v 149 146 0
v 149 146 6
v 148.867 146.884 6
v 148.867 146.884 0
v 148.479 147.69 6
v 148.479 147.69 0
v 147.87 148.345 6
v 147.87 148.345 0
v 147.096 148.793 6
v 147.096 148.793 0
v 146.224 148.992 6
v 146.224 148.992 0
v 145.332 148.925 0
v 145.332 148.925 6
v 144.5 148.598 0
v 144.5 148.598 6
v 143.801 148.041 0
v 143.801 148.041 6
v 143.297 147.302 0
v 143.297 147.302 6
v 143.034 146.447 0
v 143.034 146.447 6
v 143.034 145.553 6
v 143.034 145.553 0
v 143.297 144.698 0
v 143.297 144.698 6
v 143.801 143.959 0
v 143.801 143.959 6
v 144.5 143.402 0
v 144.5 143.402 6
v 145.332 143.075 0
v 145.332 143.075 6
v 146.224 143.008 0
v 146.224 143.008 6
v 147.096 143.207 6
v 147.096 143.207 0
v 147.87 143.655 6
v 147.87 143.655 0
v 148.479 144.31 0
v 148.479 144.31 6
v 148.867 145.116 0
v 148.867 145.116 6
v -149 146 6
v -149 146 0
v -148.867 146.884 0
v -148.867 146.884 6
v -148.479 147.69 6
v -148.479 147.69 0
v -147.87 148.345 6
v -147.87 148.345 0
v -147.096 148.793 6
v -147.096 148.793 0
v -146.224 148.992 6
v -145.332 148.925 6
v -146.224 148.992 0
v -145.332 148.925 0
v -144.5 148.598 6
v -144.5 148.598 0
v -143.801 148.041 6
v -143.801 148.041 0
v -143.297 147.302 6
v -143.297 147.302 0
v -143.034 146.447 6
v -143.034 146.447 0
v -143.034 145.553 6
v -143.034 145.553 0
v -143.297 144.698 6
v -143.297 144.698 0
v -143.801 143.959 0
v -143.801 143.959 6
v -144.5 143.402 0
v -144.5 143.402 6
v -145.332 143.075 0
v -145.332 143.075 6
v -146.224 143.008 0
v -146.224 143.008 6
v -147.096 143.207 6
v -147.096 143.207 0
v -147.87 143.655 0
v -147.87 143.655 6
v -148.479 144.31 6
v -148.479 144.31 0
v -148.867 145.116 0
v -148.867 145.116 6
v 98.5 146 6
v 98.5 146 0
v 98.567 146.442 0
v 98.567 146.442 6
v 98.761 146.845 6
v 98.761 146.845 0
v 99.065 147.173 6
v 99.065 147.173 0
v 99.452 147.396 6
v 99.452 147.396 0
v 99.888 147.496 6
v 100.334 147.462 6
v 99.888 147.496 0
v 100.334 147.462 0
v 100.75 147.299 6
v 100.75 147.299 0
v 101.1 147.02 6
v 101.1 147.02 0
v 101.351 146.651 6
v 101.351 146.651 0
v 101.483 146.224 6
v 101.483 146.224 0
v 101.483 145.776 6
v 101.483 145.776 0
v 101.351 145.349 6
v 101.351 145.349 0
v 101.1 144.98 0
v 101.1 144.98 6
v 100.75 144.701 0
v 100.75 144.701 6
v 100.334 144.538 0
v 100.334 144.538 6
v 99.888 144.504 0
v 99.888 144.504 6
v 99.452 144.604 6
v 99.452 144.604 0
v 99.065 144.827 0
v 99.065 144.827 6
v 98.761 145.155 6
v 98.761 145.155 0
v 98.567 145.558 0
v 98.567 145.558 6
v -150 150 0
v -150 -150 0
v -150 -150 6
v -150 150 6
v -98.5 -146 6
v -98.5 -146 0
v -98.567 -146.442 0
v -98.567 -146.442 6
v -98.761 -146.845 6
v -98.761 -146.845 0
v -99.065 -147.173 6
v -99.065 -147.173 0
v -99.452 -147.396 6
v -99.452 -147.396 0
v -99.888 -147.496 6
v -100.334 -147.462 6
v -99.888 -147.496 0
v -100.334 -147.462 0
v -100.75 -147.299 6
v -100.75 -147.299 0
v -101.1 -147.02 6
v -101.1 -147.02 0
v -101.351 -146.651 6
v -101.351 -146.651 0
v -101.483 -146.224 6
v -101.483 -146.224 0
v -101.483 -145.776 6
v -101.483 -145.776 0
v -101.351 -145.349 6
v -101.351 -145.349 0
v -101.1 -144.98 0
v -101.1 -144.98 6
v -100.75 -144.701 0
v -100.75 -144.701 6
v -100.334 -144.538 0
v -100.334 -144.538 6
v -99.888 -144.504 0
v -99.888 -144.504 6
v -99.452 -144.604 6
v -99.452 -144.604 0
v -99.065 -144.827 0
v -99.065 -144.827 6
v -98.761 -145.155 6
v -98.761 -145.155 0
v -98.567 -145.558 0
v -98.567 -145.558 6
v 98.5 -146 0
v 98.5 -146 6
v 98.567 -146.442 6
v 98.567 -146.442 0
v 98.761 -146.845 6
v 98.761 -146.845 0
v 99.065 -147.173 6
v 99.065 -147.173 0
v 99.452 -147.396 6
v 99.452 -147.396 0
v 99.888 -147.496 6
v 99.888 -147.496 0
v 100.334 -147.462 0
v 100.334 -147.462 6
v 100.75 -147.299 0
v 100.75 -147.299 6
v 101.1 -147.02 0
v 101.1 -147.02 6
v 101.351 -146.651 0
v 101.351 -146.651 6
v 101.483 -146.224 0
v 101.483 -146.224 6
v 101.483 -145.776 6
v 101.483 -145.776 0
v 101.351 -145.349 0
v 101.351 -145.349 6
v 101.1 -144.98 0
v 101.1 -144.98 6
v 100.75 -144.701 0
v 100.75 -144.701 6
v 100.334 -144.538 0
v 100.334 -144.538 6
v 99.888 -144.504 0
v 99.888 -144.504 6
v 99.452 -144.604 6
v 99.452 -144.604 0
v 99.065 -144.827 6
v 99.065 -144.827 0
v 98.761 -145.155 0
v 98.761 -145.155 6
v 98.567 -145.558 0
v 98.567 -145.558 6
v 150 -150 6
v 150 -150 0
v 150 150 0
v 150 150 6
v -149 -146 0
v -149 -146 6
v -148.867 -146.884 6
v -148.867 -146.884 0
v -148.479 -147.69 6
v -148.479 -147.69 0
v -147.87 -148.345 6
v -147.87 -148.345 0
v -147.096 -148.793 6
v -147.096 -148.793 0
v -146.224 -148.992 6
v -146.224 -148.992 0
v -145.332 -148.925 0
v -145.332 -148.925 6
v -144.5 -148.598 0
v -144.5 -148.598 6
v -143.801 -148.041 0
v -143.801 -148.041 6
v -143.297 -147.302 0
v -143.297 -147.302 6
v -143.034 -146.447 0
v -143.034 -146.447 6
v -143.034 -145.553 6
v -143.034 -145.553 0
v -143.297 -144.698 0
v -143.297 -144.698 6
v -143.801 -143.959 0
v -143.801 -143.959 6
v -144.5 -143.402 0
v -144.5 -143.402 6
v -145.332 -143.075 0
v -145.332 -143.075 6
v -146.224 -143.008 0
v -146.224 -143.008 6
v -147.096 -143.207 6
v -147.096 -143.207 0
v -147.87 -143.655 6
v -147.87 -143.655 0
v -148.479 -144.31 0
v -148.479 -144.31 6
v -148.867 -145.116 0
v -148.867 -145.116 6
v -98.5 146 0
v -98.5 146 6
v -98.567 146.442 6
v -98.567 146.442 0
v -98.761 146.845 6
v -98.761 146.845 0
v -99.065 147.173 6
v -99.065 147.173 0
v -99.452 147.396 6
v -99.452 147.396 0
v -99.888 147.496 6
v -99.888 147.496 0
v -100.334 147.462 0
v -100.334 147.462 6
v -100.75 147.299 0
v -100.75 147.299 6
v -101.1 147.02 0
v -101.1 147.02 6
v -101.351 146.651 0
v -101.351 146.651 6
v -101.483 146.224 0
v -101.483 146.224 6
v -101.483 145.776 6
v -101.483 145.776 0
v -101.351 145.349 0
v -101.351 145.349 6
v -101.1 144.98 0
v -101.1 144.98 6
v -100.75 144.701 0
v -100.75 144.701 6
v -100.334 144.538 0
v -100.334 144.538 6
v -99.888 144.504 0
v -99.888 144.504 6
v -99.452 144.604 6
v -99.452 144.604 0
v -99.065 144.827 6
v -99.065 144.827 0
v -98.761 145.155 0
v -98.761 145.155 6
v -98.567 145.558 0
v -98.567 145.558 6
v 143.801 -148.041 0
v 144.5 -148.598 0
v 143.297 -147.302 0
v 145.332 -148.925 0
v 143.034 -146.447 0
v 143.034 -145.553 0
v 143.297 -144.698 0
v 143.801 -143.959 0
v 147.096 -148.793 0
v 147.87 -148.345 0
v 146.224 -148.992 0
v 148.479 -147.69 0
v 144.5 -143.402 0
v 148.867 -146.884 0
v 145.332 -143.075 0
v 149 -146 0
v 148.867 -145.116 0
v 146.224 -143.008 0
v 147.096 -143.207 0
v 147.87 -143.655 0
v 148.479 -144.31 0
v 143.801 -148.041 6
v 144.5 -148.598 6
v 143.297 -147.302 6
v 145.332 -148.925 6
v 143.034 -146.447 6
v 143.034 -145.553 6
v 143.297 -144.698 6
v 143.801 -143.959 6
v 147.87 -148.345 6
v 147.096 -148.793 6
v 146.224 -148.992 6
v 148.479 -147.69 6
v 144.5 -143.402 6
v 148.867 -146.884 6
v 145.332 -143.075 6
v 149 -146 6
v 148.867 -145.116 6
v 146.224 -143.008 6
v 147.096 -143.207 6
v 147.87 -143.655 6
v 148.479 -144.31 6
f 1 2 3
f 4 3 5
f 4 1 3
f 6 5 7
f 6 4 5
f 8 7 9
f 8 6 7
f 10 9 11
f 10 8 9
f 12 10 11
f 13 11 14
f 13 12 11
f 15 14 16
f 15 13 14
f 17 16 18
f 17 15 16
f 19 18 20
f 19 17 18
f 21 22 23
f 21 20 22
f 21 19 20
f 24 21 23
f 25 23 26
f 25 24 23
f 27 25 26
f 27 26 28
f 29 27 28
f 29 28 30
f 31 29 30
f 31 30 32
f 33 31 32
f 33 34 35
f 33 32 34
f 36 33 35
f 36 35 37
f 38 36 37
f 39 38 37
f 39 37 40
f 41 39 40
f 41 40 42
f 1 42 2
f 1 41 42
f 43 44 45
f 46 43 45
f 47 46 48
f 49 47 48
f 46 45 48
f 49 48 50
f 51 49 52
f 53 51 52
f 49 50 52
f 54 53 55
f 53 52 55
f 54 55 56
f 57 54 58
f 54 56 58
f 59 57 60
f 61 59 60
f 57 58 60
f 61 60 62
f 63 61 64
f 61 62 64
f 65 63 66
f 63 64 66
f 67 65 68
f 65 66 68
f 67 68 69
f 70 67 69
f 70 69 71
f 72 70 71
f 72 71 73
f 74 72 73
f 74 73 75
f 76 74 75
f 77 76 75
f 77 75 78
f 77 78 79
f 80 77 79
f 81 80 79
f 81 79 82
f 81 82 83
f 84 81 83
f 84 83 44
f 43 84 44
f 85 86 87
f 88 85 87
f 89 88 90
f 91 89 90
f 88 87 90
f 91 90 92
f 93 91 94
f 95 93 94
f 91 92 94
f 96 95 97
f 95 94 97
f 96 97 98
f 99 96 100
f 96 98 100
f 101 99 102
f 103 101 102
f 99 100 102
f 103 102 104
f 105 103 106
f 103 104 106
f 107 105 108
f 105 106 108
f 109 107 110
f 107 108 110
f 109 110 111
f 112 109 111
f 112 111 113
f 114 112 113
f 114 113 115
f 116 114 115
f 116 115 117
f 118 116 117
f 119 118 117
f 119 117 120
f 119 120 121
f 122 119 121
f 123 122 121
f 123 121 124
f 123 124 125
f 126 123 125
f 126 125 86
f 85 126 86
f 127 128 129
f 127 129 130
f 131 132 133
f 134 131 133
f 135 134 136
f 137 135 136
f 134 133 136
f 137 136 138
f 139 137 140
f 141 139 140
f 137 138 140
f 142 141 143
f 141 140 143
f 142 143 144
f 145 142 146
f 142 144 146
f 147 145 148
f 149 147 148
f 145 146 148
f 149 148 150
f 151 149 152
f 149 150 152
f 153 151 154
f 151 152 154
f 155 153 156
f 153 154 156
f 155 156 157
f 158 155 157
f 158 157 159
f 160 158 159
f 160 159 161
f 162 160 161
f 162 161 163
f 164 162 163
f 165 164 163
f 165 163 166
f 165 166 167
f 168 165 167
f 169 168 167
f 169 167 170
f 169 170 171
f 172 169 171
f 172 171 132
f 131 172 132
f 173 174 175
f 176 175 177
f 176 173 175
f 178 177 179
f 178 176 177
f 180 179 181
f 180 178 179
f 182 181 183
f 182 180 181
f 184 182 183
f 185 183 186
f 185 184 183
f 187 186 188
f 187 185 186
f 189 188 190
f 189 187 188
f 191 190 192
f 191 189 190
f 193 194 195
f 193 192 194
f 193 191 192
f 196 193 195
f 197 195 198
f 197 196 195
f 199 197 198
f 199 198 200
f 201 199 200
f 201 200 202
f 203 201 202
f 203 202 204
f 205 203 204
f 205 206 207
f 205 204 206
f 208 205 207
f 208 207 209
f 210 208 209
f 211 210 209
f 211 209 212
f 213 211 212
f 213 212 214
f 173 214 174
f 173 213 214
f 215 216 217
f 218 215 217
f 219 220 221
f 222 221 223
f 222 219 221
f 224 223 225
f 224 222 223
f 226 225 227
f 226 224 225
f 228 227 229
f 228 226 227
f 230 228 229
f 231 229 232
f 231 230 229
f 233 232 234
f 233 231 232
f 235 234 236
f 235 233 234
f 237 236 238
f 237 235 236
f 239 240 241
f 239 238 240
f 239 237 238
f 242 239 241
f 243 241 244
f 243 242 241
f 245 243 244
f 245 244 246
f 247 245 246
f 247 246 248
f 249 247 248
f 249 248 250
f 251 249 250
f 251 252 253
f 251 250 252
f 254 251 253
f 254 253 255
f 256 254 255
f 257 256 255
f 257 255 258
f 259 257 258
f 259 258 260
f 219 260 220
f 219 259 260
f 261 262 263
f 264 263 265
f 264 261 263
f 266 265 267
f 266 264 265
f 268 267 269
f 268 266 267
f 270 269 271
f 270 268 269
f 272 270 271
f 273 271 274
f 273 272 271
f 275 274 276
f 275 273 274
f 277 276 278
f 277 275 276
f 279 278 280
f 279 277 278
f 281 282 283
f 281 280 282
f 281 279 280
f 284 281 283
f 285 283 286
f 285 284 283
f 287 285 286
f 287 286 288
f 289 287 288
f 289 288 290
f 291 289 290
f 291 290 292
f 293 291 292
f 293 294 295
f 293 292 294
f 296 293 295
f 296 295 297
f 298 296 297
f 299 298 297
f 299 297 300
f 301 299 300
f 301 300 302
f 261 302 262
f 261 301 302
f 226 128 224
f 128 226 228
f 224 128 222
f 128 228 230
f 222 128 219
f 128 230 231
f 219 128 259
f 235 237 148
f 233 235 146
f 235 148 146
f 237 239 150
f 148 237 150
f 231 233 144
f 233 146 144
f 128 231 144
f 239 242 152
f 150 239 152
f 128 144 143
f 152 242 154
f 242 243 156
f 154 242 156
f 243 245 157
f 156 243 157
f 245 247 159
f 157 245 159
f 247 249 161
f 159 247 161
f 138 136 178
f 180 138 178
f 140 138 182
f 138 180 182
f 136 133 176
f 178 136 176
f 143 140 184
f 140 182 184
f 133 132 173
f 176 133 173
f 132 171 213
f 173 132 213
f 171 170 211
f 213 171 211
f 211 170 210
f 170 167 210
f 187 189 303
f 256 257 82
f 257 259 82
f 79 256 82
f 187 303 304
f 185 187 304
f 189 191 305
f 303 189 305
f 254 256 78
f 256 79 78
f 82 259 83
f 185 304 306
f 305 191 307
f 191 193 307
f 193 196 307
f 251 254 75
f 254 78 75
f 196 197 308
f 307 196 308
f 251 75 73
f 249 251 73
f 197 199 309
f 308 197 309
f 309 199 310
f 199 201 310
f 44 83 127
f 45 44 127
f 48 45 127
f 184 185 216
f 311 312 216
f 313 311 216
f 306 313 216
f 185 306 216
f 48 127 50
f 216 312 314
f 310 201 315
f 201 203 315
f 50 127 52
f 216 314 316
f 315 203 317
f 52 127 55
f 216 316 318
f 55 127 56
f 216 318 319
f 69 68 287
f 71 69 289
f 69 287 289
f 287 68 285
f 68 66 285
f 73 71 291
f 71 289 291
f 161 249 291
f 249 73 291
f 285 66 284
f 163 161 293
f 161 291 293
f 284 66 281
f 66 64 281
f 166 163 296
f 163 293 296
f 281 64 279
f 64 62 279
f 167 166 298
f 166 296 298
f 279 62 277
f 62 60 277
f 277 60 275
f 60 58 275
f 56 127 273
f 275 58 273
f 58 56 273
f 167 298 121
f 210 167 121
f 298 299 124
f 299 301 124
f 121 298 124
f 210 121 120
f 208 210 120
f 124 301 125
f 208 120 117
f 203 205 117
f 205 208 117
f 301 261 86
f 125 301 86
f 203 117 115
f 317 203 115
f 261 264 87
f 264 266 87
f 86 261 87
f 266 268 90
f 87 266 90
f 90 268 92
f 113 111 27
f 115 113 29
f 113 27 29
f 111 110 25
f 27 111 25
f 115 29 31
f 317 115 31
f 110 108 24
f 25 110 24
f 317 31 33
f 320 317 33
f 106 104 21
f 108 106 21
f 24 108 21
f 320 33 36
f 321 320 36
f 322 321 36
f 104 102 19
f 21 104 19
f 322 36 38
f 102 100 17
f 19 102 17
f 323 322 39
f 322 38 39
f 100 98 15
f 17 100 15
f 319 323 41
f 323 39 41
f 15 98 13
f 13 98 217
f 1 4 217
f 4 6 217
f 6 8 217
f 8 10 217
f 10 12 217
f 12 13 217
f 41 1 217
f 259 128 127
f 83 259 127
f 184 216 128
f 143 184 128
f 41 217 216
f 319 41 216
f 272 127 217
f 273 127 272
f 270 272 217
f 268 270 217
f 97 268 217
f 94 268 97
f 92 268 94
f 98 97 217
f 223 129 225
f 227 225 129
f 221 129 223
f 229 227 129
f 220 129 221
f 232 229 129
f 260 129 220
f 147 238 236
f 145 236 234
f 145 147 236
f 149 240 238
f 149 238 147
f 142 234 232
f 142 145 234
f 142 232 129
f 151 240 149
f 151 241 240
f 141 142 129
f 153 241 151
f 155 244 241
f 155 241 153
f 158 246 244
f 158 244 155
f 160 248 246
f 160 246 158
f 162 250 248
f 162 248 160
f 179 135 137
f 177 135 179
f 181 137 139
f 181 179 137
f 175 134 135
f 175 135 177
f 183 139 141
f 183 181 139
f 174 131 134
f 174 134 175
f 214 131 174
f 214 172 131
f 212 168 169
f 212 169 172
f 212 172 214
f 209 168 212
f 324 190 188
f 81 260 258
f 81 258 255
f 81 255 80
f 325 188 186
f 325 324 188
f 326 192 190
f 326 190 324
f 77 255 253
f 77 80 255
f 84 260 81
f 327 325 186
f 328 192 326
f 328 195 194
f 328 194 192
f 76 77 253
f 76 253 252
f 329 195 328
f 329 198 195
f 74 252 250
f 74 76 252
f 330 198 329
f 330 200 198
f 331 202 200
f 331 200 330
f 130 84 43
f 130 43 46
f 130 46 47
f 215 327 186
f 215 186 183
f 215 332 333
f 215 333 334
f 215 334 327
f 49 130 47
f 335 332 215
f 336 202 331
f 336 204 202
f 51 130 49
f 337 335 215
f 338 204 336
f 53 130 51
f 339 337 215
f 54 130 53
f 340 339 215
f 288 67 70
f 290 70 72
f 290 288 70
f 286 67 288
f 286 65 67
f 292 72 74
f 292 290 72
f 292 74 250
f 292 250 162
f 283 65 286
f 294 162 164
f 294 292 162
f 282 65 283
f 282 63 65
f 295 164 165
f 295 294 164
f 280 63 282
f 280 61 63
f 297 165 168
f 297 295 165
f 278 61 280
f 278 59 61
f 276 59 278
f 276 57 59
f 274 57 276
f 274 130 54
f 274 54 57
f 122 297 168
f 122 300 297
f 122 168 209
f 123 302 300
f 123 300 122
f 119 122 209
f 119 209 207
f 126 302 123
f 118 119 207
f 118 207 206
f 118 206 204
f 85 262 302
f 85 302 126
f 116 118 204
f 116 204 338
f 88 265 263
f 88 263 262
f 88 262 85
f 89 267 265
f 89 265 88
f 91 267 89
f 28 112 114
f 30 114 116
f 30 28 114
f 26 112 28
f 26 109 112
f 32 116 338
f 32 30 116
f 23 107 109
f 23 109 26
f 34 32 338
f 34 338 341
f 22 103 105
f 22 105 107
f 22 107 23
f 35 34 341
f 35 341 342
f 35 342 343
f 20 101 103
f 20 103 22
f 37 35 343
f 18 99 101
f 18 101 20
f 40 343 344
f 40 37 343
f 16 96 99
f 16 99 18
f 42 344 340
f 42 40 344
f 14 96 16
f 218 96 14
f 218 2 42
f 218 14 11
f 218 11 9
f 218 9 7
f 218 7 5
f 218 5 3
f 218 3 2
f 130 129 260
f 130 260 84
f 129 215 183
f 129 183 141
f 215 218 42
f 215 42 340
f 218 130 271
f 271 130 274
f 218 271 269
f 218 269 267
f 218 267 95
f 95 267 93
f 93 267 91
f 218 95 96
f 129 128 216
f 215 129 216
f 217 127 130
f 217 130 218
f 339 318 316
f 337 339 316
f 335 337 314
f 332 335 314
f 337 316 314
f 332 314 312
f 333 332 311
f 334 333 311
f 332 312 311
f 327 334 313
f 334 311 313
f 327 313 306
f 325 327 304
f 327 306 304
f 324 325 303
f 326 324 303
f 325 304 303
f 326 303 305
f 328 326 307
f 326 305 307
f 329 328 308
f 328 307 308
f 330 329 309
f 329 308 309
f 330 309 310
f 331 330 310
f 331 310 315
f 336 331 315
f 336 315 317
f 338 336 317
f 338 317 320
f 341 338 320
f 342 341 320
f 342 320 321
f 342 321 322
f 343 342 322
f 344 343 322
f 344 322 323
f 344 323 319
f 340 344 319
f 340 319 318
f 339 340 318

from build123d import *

# Parameters (mm, degrees)
SKETCH2_W               = 300
SKETCH2_H               = 300
BOSS_EXTRUDE1_DEPTH     = 6
SKETCH3_R               = 3
CUT_EXTRUDE1_DEPTH      = 213.216870206
SKETCH5_R               = 1.5
CUT_EXTRUDE2_DEPTH      = 213.216870206
MIRROR4_COPY_1_SKETCH_R = 3
MIRROR4_COPY_1_DEPTH    = 213.216870206
MIRROR4_COPY_2_SKETCH_R = 1.5
MIRROR4_COPY_2_DEPTH    = 213.216870206


with BuildPart() as part:
    # Sketch2 → Boss-Extrude1 (new body)
    with BuildSketch(Plane.XY):
        Rectangle(SKETCH2_W, SKETCH2_H)
    extrude(amount=BOSS_EXTRUDE1_DEPTH)

    # Sketch3 → Cut-Extrude1 (cut, through all)
    with BuildSketch(Plane(origin=(0, 0, 0), x_dir=(-1, 0, 0), z_dir=(0, 0, -1))):
        with Locations((146, 146)):
            Circle(SKETCH3_R)
    cut_extrude1 = extrude(amount=-CUT_EXTRUDE1_DEPTH, mode=Mode.SUBTRACT)

    # Sketch5 → Cut-Extrude2 (cut, through all)
    with BuildSketch(Plane.XY):
        with Locations((-100, 146)):
            Circle(SKETCH5_R)
    cut_extrude2 = extrude(amount=CUT_EXTRUDE2_DEPTH, mode=Mode.SUBTRACT)

    # Mirror3: Cut-Extrude1, Cut-Extrude2 across plane
    add(cut_extrude1.mirror(Plane(origin=(0, 0, 0), x_dir=(0, 0, 1), z_dir=(1, 0, 0))), mode=Mode.SUBTRACT)
    add(cut_extrude2.mirror(Plane(origin=(0, 0, 0), x_dir=(0, 0, 1), z_dir=(1, 0, 0))), mode=Mode.SUBTRACT)

    # Mirror4: Cut-Extrude1, Cut-Extrude2 across plane
    add(cut_extrude1.mirror(Plane.ZX), mode=Mode.SUBTRACT)
    add(cut_extrude2.mirror(Plane.ZX), mode=Mode.SUBTRACT)

    # Mirror4 copy 1 sketch → Mirror4 copy 1 (cut, through all)
    with BuildSketch(Plane(origin=(0, 0, 0), x_dir=(1, 0, 0), z_dir=(0, 0, -1))):
        with Locations((146, 146)):
            Circle(MIRROR4_COPY_1_SKETCH_R)
    extrude(amount=-MIRROR4_COPY_1_DEPTH, mode=Mode.SUBTRACT)

    # Mirror4 copy 2 sketch → Mirror4 copy 2 (cut, through all)
    with BuildSketch(Plane(origin=(0, 0, 0), x_dir=(-1, 0, 0), z_dir=(0, 0, 1))):
        with Locations((-100, 146)):
            Circle(MIRROR4_COPY_2_SKETCH_R)
    extrude(amount=MIRROR4_COPY_2_DEPTH, mode=Mode.SUBTRACT)


solid = part.part
